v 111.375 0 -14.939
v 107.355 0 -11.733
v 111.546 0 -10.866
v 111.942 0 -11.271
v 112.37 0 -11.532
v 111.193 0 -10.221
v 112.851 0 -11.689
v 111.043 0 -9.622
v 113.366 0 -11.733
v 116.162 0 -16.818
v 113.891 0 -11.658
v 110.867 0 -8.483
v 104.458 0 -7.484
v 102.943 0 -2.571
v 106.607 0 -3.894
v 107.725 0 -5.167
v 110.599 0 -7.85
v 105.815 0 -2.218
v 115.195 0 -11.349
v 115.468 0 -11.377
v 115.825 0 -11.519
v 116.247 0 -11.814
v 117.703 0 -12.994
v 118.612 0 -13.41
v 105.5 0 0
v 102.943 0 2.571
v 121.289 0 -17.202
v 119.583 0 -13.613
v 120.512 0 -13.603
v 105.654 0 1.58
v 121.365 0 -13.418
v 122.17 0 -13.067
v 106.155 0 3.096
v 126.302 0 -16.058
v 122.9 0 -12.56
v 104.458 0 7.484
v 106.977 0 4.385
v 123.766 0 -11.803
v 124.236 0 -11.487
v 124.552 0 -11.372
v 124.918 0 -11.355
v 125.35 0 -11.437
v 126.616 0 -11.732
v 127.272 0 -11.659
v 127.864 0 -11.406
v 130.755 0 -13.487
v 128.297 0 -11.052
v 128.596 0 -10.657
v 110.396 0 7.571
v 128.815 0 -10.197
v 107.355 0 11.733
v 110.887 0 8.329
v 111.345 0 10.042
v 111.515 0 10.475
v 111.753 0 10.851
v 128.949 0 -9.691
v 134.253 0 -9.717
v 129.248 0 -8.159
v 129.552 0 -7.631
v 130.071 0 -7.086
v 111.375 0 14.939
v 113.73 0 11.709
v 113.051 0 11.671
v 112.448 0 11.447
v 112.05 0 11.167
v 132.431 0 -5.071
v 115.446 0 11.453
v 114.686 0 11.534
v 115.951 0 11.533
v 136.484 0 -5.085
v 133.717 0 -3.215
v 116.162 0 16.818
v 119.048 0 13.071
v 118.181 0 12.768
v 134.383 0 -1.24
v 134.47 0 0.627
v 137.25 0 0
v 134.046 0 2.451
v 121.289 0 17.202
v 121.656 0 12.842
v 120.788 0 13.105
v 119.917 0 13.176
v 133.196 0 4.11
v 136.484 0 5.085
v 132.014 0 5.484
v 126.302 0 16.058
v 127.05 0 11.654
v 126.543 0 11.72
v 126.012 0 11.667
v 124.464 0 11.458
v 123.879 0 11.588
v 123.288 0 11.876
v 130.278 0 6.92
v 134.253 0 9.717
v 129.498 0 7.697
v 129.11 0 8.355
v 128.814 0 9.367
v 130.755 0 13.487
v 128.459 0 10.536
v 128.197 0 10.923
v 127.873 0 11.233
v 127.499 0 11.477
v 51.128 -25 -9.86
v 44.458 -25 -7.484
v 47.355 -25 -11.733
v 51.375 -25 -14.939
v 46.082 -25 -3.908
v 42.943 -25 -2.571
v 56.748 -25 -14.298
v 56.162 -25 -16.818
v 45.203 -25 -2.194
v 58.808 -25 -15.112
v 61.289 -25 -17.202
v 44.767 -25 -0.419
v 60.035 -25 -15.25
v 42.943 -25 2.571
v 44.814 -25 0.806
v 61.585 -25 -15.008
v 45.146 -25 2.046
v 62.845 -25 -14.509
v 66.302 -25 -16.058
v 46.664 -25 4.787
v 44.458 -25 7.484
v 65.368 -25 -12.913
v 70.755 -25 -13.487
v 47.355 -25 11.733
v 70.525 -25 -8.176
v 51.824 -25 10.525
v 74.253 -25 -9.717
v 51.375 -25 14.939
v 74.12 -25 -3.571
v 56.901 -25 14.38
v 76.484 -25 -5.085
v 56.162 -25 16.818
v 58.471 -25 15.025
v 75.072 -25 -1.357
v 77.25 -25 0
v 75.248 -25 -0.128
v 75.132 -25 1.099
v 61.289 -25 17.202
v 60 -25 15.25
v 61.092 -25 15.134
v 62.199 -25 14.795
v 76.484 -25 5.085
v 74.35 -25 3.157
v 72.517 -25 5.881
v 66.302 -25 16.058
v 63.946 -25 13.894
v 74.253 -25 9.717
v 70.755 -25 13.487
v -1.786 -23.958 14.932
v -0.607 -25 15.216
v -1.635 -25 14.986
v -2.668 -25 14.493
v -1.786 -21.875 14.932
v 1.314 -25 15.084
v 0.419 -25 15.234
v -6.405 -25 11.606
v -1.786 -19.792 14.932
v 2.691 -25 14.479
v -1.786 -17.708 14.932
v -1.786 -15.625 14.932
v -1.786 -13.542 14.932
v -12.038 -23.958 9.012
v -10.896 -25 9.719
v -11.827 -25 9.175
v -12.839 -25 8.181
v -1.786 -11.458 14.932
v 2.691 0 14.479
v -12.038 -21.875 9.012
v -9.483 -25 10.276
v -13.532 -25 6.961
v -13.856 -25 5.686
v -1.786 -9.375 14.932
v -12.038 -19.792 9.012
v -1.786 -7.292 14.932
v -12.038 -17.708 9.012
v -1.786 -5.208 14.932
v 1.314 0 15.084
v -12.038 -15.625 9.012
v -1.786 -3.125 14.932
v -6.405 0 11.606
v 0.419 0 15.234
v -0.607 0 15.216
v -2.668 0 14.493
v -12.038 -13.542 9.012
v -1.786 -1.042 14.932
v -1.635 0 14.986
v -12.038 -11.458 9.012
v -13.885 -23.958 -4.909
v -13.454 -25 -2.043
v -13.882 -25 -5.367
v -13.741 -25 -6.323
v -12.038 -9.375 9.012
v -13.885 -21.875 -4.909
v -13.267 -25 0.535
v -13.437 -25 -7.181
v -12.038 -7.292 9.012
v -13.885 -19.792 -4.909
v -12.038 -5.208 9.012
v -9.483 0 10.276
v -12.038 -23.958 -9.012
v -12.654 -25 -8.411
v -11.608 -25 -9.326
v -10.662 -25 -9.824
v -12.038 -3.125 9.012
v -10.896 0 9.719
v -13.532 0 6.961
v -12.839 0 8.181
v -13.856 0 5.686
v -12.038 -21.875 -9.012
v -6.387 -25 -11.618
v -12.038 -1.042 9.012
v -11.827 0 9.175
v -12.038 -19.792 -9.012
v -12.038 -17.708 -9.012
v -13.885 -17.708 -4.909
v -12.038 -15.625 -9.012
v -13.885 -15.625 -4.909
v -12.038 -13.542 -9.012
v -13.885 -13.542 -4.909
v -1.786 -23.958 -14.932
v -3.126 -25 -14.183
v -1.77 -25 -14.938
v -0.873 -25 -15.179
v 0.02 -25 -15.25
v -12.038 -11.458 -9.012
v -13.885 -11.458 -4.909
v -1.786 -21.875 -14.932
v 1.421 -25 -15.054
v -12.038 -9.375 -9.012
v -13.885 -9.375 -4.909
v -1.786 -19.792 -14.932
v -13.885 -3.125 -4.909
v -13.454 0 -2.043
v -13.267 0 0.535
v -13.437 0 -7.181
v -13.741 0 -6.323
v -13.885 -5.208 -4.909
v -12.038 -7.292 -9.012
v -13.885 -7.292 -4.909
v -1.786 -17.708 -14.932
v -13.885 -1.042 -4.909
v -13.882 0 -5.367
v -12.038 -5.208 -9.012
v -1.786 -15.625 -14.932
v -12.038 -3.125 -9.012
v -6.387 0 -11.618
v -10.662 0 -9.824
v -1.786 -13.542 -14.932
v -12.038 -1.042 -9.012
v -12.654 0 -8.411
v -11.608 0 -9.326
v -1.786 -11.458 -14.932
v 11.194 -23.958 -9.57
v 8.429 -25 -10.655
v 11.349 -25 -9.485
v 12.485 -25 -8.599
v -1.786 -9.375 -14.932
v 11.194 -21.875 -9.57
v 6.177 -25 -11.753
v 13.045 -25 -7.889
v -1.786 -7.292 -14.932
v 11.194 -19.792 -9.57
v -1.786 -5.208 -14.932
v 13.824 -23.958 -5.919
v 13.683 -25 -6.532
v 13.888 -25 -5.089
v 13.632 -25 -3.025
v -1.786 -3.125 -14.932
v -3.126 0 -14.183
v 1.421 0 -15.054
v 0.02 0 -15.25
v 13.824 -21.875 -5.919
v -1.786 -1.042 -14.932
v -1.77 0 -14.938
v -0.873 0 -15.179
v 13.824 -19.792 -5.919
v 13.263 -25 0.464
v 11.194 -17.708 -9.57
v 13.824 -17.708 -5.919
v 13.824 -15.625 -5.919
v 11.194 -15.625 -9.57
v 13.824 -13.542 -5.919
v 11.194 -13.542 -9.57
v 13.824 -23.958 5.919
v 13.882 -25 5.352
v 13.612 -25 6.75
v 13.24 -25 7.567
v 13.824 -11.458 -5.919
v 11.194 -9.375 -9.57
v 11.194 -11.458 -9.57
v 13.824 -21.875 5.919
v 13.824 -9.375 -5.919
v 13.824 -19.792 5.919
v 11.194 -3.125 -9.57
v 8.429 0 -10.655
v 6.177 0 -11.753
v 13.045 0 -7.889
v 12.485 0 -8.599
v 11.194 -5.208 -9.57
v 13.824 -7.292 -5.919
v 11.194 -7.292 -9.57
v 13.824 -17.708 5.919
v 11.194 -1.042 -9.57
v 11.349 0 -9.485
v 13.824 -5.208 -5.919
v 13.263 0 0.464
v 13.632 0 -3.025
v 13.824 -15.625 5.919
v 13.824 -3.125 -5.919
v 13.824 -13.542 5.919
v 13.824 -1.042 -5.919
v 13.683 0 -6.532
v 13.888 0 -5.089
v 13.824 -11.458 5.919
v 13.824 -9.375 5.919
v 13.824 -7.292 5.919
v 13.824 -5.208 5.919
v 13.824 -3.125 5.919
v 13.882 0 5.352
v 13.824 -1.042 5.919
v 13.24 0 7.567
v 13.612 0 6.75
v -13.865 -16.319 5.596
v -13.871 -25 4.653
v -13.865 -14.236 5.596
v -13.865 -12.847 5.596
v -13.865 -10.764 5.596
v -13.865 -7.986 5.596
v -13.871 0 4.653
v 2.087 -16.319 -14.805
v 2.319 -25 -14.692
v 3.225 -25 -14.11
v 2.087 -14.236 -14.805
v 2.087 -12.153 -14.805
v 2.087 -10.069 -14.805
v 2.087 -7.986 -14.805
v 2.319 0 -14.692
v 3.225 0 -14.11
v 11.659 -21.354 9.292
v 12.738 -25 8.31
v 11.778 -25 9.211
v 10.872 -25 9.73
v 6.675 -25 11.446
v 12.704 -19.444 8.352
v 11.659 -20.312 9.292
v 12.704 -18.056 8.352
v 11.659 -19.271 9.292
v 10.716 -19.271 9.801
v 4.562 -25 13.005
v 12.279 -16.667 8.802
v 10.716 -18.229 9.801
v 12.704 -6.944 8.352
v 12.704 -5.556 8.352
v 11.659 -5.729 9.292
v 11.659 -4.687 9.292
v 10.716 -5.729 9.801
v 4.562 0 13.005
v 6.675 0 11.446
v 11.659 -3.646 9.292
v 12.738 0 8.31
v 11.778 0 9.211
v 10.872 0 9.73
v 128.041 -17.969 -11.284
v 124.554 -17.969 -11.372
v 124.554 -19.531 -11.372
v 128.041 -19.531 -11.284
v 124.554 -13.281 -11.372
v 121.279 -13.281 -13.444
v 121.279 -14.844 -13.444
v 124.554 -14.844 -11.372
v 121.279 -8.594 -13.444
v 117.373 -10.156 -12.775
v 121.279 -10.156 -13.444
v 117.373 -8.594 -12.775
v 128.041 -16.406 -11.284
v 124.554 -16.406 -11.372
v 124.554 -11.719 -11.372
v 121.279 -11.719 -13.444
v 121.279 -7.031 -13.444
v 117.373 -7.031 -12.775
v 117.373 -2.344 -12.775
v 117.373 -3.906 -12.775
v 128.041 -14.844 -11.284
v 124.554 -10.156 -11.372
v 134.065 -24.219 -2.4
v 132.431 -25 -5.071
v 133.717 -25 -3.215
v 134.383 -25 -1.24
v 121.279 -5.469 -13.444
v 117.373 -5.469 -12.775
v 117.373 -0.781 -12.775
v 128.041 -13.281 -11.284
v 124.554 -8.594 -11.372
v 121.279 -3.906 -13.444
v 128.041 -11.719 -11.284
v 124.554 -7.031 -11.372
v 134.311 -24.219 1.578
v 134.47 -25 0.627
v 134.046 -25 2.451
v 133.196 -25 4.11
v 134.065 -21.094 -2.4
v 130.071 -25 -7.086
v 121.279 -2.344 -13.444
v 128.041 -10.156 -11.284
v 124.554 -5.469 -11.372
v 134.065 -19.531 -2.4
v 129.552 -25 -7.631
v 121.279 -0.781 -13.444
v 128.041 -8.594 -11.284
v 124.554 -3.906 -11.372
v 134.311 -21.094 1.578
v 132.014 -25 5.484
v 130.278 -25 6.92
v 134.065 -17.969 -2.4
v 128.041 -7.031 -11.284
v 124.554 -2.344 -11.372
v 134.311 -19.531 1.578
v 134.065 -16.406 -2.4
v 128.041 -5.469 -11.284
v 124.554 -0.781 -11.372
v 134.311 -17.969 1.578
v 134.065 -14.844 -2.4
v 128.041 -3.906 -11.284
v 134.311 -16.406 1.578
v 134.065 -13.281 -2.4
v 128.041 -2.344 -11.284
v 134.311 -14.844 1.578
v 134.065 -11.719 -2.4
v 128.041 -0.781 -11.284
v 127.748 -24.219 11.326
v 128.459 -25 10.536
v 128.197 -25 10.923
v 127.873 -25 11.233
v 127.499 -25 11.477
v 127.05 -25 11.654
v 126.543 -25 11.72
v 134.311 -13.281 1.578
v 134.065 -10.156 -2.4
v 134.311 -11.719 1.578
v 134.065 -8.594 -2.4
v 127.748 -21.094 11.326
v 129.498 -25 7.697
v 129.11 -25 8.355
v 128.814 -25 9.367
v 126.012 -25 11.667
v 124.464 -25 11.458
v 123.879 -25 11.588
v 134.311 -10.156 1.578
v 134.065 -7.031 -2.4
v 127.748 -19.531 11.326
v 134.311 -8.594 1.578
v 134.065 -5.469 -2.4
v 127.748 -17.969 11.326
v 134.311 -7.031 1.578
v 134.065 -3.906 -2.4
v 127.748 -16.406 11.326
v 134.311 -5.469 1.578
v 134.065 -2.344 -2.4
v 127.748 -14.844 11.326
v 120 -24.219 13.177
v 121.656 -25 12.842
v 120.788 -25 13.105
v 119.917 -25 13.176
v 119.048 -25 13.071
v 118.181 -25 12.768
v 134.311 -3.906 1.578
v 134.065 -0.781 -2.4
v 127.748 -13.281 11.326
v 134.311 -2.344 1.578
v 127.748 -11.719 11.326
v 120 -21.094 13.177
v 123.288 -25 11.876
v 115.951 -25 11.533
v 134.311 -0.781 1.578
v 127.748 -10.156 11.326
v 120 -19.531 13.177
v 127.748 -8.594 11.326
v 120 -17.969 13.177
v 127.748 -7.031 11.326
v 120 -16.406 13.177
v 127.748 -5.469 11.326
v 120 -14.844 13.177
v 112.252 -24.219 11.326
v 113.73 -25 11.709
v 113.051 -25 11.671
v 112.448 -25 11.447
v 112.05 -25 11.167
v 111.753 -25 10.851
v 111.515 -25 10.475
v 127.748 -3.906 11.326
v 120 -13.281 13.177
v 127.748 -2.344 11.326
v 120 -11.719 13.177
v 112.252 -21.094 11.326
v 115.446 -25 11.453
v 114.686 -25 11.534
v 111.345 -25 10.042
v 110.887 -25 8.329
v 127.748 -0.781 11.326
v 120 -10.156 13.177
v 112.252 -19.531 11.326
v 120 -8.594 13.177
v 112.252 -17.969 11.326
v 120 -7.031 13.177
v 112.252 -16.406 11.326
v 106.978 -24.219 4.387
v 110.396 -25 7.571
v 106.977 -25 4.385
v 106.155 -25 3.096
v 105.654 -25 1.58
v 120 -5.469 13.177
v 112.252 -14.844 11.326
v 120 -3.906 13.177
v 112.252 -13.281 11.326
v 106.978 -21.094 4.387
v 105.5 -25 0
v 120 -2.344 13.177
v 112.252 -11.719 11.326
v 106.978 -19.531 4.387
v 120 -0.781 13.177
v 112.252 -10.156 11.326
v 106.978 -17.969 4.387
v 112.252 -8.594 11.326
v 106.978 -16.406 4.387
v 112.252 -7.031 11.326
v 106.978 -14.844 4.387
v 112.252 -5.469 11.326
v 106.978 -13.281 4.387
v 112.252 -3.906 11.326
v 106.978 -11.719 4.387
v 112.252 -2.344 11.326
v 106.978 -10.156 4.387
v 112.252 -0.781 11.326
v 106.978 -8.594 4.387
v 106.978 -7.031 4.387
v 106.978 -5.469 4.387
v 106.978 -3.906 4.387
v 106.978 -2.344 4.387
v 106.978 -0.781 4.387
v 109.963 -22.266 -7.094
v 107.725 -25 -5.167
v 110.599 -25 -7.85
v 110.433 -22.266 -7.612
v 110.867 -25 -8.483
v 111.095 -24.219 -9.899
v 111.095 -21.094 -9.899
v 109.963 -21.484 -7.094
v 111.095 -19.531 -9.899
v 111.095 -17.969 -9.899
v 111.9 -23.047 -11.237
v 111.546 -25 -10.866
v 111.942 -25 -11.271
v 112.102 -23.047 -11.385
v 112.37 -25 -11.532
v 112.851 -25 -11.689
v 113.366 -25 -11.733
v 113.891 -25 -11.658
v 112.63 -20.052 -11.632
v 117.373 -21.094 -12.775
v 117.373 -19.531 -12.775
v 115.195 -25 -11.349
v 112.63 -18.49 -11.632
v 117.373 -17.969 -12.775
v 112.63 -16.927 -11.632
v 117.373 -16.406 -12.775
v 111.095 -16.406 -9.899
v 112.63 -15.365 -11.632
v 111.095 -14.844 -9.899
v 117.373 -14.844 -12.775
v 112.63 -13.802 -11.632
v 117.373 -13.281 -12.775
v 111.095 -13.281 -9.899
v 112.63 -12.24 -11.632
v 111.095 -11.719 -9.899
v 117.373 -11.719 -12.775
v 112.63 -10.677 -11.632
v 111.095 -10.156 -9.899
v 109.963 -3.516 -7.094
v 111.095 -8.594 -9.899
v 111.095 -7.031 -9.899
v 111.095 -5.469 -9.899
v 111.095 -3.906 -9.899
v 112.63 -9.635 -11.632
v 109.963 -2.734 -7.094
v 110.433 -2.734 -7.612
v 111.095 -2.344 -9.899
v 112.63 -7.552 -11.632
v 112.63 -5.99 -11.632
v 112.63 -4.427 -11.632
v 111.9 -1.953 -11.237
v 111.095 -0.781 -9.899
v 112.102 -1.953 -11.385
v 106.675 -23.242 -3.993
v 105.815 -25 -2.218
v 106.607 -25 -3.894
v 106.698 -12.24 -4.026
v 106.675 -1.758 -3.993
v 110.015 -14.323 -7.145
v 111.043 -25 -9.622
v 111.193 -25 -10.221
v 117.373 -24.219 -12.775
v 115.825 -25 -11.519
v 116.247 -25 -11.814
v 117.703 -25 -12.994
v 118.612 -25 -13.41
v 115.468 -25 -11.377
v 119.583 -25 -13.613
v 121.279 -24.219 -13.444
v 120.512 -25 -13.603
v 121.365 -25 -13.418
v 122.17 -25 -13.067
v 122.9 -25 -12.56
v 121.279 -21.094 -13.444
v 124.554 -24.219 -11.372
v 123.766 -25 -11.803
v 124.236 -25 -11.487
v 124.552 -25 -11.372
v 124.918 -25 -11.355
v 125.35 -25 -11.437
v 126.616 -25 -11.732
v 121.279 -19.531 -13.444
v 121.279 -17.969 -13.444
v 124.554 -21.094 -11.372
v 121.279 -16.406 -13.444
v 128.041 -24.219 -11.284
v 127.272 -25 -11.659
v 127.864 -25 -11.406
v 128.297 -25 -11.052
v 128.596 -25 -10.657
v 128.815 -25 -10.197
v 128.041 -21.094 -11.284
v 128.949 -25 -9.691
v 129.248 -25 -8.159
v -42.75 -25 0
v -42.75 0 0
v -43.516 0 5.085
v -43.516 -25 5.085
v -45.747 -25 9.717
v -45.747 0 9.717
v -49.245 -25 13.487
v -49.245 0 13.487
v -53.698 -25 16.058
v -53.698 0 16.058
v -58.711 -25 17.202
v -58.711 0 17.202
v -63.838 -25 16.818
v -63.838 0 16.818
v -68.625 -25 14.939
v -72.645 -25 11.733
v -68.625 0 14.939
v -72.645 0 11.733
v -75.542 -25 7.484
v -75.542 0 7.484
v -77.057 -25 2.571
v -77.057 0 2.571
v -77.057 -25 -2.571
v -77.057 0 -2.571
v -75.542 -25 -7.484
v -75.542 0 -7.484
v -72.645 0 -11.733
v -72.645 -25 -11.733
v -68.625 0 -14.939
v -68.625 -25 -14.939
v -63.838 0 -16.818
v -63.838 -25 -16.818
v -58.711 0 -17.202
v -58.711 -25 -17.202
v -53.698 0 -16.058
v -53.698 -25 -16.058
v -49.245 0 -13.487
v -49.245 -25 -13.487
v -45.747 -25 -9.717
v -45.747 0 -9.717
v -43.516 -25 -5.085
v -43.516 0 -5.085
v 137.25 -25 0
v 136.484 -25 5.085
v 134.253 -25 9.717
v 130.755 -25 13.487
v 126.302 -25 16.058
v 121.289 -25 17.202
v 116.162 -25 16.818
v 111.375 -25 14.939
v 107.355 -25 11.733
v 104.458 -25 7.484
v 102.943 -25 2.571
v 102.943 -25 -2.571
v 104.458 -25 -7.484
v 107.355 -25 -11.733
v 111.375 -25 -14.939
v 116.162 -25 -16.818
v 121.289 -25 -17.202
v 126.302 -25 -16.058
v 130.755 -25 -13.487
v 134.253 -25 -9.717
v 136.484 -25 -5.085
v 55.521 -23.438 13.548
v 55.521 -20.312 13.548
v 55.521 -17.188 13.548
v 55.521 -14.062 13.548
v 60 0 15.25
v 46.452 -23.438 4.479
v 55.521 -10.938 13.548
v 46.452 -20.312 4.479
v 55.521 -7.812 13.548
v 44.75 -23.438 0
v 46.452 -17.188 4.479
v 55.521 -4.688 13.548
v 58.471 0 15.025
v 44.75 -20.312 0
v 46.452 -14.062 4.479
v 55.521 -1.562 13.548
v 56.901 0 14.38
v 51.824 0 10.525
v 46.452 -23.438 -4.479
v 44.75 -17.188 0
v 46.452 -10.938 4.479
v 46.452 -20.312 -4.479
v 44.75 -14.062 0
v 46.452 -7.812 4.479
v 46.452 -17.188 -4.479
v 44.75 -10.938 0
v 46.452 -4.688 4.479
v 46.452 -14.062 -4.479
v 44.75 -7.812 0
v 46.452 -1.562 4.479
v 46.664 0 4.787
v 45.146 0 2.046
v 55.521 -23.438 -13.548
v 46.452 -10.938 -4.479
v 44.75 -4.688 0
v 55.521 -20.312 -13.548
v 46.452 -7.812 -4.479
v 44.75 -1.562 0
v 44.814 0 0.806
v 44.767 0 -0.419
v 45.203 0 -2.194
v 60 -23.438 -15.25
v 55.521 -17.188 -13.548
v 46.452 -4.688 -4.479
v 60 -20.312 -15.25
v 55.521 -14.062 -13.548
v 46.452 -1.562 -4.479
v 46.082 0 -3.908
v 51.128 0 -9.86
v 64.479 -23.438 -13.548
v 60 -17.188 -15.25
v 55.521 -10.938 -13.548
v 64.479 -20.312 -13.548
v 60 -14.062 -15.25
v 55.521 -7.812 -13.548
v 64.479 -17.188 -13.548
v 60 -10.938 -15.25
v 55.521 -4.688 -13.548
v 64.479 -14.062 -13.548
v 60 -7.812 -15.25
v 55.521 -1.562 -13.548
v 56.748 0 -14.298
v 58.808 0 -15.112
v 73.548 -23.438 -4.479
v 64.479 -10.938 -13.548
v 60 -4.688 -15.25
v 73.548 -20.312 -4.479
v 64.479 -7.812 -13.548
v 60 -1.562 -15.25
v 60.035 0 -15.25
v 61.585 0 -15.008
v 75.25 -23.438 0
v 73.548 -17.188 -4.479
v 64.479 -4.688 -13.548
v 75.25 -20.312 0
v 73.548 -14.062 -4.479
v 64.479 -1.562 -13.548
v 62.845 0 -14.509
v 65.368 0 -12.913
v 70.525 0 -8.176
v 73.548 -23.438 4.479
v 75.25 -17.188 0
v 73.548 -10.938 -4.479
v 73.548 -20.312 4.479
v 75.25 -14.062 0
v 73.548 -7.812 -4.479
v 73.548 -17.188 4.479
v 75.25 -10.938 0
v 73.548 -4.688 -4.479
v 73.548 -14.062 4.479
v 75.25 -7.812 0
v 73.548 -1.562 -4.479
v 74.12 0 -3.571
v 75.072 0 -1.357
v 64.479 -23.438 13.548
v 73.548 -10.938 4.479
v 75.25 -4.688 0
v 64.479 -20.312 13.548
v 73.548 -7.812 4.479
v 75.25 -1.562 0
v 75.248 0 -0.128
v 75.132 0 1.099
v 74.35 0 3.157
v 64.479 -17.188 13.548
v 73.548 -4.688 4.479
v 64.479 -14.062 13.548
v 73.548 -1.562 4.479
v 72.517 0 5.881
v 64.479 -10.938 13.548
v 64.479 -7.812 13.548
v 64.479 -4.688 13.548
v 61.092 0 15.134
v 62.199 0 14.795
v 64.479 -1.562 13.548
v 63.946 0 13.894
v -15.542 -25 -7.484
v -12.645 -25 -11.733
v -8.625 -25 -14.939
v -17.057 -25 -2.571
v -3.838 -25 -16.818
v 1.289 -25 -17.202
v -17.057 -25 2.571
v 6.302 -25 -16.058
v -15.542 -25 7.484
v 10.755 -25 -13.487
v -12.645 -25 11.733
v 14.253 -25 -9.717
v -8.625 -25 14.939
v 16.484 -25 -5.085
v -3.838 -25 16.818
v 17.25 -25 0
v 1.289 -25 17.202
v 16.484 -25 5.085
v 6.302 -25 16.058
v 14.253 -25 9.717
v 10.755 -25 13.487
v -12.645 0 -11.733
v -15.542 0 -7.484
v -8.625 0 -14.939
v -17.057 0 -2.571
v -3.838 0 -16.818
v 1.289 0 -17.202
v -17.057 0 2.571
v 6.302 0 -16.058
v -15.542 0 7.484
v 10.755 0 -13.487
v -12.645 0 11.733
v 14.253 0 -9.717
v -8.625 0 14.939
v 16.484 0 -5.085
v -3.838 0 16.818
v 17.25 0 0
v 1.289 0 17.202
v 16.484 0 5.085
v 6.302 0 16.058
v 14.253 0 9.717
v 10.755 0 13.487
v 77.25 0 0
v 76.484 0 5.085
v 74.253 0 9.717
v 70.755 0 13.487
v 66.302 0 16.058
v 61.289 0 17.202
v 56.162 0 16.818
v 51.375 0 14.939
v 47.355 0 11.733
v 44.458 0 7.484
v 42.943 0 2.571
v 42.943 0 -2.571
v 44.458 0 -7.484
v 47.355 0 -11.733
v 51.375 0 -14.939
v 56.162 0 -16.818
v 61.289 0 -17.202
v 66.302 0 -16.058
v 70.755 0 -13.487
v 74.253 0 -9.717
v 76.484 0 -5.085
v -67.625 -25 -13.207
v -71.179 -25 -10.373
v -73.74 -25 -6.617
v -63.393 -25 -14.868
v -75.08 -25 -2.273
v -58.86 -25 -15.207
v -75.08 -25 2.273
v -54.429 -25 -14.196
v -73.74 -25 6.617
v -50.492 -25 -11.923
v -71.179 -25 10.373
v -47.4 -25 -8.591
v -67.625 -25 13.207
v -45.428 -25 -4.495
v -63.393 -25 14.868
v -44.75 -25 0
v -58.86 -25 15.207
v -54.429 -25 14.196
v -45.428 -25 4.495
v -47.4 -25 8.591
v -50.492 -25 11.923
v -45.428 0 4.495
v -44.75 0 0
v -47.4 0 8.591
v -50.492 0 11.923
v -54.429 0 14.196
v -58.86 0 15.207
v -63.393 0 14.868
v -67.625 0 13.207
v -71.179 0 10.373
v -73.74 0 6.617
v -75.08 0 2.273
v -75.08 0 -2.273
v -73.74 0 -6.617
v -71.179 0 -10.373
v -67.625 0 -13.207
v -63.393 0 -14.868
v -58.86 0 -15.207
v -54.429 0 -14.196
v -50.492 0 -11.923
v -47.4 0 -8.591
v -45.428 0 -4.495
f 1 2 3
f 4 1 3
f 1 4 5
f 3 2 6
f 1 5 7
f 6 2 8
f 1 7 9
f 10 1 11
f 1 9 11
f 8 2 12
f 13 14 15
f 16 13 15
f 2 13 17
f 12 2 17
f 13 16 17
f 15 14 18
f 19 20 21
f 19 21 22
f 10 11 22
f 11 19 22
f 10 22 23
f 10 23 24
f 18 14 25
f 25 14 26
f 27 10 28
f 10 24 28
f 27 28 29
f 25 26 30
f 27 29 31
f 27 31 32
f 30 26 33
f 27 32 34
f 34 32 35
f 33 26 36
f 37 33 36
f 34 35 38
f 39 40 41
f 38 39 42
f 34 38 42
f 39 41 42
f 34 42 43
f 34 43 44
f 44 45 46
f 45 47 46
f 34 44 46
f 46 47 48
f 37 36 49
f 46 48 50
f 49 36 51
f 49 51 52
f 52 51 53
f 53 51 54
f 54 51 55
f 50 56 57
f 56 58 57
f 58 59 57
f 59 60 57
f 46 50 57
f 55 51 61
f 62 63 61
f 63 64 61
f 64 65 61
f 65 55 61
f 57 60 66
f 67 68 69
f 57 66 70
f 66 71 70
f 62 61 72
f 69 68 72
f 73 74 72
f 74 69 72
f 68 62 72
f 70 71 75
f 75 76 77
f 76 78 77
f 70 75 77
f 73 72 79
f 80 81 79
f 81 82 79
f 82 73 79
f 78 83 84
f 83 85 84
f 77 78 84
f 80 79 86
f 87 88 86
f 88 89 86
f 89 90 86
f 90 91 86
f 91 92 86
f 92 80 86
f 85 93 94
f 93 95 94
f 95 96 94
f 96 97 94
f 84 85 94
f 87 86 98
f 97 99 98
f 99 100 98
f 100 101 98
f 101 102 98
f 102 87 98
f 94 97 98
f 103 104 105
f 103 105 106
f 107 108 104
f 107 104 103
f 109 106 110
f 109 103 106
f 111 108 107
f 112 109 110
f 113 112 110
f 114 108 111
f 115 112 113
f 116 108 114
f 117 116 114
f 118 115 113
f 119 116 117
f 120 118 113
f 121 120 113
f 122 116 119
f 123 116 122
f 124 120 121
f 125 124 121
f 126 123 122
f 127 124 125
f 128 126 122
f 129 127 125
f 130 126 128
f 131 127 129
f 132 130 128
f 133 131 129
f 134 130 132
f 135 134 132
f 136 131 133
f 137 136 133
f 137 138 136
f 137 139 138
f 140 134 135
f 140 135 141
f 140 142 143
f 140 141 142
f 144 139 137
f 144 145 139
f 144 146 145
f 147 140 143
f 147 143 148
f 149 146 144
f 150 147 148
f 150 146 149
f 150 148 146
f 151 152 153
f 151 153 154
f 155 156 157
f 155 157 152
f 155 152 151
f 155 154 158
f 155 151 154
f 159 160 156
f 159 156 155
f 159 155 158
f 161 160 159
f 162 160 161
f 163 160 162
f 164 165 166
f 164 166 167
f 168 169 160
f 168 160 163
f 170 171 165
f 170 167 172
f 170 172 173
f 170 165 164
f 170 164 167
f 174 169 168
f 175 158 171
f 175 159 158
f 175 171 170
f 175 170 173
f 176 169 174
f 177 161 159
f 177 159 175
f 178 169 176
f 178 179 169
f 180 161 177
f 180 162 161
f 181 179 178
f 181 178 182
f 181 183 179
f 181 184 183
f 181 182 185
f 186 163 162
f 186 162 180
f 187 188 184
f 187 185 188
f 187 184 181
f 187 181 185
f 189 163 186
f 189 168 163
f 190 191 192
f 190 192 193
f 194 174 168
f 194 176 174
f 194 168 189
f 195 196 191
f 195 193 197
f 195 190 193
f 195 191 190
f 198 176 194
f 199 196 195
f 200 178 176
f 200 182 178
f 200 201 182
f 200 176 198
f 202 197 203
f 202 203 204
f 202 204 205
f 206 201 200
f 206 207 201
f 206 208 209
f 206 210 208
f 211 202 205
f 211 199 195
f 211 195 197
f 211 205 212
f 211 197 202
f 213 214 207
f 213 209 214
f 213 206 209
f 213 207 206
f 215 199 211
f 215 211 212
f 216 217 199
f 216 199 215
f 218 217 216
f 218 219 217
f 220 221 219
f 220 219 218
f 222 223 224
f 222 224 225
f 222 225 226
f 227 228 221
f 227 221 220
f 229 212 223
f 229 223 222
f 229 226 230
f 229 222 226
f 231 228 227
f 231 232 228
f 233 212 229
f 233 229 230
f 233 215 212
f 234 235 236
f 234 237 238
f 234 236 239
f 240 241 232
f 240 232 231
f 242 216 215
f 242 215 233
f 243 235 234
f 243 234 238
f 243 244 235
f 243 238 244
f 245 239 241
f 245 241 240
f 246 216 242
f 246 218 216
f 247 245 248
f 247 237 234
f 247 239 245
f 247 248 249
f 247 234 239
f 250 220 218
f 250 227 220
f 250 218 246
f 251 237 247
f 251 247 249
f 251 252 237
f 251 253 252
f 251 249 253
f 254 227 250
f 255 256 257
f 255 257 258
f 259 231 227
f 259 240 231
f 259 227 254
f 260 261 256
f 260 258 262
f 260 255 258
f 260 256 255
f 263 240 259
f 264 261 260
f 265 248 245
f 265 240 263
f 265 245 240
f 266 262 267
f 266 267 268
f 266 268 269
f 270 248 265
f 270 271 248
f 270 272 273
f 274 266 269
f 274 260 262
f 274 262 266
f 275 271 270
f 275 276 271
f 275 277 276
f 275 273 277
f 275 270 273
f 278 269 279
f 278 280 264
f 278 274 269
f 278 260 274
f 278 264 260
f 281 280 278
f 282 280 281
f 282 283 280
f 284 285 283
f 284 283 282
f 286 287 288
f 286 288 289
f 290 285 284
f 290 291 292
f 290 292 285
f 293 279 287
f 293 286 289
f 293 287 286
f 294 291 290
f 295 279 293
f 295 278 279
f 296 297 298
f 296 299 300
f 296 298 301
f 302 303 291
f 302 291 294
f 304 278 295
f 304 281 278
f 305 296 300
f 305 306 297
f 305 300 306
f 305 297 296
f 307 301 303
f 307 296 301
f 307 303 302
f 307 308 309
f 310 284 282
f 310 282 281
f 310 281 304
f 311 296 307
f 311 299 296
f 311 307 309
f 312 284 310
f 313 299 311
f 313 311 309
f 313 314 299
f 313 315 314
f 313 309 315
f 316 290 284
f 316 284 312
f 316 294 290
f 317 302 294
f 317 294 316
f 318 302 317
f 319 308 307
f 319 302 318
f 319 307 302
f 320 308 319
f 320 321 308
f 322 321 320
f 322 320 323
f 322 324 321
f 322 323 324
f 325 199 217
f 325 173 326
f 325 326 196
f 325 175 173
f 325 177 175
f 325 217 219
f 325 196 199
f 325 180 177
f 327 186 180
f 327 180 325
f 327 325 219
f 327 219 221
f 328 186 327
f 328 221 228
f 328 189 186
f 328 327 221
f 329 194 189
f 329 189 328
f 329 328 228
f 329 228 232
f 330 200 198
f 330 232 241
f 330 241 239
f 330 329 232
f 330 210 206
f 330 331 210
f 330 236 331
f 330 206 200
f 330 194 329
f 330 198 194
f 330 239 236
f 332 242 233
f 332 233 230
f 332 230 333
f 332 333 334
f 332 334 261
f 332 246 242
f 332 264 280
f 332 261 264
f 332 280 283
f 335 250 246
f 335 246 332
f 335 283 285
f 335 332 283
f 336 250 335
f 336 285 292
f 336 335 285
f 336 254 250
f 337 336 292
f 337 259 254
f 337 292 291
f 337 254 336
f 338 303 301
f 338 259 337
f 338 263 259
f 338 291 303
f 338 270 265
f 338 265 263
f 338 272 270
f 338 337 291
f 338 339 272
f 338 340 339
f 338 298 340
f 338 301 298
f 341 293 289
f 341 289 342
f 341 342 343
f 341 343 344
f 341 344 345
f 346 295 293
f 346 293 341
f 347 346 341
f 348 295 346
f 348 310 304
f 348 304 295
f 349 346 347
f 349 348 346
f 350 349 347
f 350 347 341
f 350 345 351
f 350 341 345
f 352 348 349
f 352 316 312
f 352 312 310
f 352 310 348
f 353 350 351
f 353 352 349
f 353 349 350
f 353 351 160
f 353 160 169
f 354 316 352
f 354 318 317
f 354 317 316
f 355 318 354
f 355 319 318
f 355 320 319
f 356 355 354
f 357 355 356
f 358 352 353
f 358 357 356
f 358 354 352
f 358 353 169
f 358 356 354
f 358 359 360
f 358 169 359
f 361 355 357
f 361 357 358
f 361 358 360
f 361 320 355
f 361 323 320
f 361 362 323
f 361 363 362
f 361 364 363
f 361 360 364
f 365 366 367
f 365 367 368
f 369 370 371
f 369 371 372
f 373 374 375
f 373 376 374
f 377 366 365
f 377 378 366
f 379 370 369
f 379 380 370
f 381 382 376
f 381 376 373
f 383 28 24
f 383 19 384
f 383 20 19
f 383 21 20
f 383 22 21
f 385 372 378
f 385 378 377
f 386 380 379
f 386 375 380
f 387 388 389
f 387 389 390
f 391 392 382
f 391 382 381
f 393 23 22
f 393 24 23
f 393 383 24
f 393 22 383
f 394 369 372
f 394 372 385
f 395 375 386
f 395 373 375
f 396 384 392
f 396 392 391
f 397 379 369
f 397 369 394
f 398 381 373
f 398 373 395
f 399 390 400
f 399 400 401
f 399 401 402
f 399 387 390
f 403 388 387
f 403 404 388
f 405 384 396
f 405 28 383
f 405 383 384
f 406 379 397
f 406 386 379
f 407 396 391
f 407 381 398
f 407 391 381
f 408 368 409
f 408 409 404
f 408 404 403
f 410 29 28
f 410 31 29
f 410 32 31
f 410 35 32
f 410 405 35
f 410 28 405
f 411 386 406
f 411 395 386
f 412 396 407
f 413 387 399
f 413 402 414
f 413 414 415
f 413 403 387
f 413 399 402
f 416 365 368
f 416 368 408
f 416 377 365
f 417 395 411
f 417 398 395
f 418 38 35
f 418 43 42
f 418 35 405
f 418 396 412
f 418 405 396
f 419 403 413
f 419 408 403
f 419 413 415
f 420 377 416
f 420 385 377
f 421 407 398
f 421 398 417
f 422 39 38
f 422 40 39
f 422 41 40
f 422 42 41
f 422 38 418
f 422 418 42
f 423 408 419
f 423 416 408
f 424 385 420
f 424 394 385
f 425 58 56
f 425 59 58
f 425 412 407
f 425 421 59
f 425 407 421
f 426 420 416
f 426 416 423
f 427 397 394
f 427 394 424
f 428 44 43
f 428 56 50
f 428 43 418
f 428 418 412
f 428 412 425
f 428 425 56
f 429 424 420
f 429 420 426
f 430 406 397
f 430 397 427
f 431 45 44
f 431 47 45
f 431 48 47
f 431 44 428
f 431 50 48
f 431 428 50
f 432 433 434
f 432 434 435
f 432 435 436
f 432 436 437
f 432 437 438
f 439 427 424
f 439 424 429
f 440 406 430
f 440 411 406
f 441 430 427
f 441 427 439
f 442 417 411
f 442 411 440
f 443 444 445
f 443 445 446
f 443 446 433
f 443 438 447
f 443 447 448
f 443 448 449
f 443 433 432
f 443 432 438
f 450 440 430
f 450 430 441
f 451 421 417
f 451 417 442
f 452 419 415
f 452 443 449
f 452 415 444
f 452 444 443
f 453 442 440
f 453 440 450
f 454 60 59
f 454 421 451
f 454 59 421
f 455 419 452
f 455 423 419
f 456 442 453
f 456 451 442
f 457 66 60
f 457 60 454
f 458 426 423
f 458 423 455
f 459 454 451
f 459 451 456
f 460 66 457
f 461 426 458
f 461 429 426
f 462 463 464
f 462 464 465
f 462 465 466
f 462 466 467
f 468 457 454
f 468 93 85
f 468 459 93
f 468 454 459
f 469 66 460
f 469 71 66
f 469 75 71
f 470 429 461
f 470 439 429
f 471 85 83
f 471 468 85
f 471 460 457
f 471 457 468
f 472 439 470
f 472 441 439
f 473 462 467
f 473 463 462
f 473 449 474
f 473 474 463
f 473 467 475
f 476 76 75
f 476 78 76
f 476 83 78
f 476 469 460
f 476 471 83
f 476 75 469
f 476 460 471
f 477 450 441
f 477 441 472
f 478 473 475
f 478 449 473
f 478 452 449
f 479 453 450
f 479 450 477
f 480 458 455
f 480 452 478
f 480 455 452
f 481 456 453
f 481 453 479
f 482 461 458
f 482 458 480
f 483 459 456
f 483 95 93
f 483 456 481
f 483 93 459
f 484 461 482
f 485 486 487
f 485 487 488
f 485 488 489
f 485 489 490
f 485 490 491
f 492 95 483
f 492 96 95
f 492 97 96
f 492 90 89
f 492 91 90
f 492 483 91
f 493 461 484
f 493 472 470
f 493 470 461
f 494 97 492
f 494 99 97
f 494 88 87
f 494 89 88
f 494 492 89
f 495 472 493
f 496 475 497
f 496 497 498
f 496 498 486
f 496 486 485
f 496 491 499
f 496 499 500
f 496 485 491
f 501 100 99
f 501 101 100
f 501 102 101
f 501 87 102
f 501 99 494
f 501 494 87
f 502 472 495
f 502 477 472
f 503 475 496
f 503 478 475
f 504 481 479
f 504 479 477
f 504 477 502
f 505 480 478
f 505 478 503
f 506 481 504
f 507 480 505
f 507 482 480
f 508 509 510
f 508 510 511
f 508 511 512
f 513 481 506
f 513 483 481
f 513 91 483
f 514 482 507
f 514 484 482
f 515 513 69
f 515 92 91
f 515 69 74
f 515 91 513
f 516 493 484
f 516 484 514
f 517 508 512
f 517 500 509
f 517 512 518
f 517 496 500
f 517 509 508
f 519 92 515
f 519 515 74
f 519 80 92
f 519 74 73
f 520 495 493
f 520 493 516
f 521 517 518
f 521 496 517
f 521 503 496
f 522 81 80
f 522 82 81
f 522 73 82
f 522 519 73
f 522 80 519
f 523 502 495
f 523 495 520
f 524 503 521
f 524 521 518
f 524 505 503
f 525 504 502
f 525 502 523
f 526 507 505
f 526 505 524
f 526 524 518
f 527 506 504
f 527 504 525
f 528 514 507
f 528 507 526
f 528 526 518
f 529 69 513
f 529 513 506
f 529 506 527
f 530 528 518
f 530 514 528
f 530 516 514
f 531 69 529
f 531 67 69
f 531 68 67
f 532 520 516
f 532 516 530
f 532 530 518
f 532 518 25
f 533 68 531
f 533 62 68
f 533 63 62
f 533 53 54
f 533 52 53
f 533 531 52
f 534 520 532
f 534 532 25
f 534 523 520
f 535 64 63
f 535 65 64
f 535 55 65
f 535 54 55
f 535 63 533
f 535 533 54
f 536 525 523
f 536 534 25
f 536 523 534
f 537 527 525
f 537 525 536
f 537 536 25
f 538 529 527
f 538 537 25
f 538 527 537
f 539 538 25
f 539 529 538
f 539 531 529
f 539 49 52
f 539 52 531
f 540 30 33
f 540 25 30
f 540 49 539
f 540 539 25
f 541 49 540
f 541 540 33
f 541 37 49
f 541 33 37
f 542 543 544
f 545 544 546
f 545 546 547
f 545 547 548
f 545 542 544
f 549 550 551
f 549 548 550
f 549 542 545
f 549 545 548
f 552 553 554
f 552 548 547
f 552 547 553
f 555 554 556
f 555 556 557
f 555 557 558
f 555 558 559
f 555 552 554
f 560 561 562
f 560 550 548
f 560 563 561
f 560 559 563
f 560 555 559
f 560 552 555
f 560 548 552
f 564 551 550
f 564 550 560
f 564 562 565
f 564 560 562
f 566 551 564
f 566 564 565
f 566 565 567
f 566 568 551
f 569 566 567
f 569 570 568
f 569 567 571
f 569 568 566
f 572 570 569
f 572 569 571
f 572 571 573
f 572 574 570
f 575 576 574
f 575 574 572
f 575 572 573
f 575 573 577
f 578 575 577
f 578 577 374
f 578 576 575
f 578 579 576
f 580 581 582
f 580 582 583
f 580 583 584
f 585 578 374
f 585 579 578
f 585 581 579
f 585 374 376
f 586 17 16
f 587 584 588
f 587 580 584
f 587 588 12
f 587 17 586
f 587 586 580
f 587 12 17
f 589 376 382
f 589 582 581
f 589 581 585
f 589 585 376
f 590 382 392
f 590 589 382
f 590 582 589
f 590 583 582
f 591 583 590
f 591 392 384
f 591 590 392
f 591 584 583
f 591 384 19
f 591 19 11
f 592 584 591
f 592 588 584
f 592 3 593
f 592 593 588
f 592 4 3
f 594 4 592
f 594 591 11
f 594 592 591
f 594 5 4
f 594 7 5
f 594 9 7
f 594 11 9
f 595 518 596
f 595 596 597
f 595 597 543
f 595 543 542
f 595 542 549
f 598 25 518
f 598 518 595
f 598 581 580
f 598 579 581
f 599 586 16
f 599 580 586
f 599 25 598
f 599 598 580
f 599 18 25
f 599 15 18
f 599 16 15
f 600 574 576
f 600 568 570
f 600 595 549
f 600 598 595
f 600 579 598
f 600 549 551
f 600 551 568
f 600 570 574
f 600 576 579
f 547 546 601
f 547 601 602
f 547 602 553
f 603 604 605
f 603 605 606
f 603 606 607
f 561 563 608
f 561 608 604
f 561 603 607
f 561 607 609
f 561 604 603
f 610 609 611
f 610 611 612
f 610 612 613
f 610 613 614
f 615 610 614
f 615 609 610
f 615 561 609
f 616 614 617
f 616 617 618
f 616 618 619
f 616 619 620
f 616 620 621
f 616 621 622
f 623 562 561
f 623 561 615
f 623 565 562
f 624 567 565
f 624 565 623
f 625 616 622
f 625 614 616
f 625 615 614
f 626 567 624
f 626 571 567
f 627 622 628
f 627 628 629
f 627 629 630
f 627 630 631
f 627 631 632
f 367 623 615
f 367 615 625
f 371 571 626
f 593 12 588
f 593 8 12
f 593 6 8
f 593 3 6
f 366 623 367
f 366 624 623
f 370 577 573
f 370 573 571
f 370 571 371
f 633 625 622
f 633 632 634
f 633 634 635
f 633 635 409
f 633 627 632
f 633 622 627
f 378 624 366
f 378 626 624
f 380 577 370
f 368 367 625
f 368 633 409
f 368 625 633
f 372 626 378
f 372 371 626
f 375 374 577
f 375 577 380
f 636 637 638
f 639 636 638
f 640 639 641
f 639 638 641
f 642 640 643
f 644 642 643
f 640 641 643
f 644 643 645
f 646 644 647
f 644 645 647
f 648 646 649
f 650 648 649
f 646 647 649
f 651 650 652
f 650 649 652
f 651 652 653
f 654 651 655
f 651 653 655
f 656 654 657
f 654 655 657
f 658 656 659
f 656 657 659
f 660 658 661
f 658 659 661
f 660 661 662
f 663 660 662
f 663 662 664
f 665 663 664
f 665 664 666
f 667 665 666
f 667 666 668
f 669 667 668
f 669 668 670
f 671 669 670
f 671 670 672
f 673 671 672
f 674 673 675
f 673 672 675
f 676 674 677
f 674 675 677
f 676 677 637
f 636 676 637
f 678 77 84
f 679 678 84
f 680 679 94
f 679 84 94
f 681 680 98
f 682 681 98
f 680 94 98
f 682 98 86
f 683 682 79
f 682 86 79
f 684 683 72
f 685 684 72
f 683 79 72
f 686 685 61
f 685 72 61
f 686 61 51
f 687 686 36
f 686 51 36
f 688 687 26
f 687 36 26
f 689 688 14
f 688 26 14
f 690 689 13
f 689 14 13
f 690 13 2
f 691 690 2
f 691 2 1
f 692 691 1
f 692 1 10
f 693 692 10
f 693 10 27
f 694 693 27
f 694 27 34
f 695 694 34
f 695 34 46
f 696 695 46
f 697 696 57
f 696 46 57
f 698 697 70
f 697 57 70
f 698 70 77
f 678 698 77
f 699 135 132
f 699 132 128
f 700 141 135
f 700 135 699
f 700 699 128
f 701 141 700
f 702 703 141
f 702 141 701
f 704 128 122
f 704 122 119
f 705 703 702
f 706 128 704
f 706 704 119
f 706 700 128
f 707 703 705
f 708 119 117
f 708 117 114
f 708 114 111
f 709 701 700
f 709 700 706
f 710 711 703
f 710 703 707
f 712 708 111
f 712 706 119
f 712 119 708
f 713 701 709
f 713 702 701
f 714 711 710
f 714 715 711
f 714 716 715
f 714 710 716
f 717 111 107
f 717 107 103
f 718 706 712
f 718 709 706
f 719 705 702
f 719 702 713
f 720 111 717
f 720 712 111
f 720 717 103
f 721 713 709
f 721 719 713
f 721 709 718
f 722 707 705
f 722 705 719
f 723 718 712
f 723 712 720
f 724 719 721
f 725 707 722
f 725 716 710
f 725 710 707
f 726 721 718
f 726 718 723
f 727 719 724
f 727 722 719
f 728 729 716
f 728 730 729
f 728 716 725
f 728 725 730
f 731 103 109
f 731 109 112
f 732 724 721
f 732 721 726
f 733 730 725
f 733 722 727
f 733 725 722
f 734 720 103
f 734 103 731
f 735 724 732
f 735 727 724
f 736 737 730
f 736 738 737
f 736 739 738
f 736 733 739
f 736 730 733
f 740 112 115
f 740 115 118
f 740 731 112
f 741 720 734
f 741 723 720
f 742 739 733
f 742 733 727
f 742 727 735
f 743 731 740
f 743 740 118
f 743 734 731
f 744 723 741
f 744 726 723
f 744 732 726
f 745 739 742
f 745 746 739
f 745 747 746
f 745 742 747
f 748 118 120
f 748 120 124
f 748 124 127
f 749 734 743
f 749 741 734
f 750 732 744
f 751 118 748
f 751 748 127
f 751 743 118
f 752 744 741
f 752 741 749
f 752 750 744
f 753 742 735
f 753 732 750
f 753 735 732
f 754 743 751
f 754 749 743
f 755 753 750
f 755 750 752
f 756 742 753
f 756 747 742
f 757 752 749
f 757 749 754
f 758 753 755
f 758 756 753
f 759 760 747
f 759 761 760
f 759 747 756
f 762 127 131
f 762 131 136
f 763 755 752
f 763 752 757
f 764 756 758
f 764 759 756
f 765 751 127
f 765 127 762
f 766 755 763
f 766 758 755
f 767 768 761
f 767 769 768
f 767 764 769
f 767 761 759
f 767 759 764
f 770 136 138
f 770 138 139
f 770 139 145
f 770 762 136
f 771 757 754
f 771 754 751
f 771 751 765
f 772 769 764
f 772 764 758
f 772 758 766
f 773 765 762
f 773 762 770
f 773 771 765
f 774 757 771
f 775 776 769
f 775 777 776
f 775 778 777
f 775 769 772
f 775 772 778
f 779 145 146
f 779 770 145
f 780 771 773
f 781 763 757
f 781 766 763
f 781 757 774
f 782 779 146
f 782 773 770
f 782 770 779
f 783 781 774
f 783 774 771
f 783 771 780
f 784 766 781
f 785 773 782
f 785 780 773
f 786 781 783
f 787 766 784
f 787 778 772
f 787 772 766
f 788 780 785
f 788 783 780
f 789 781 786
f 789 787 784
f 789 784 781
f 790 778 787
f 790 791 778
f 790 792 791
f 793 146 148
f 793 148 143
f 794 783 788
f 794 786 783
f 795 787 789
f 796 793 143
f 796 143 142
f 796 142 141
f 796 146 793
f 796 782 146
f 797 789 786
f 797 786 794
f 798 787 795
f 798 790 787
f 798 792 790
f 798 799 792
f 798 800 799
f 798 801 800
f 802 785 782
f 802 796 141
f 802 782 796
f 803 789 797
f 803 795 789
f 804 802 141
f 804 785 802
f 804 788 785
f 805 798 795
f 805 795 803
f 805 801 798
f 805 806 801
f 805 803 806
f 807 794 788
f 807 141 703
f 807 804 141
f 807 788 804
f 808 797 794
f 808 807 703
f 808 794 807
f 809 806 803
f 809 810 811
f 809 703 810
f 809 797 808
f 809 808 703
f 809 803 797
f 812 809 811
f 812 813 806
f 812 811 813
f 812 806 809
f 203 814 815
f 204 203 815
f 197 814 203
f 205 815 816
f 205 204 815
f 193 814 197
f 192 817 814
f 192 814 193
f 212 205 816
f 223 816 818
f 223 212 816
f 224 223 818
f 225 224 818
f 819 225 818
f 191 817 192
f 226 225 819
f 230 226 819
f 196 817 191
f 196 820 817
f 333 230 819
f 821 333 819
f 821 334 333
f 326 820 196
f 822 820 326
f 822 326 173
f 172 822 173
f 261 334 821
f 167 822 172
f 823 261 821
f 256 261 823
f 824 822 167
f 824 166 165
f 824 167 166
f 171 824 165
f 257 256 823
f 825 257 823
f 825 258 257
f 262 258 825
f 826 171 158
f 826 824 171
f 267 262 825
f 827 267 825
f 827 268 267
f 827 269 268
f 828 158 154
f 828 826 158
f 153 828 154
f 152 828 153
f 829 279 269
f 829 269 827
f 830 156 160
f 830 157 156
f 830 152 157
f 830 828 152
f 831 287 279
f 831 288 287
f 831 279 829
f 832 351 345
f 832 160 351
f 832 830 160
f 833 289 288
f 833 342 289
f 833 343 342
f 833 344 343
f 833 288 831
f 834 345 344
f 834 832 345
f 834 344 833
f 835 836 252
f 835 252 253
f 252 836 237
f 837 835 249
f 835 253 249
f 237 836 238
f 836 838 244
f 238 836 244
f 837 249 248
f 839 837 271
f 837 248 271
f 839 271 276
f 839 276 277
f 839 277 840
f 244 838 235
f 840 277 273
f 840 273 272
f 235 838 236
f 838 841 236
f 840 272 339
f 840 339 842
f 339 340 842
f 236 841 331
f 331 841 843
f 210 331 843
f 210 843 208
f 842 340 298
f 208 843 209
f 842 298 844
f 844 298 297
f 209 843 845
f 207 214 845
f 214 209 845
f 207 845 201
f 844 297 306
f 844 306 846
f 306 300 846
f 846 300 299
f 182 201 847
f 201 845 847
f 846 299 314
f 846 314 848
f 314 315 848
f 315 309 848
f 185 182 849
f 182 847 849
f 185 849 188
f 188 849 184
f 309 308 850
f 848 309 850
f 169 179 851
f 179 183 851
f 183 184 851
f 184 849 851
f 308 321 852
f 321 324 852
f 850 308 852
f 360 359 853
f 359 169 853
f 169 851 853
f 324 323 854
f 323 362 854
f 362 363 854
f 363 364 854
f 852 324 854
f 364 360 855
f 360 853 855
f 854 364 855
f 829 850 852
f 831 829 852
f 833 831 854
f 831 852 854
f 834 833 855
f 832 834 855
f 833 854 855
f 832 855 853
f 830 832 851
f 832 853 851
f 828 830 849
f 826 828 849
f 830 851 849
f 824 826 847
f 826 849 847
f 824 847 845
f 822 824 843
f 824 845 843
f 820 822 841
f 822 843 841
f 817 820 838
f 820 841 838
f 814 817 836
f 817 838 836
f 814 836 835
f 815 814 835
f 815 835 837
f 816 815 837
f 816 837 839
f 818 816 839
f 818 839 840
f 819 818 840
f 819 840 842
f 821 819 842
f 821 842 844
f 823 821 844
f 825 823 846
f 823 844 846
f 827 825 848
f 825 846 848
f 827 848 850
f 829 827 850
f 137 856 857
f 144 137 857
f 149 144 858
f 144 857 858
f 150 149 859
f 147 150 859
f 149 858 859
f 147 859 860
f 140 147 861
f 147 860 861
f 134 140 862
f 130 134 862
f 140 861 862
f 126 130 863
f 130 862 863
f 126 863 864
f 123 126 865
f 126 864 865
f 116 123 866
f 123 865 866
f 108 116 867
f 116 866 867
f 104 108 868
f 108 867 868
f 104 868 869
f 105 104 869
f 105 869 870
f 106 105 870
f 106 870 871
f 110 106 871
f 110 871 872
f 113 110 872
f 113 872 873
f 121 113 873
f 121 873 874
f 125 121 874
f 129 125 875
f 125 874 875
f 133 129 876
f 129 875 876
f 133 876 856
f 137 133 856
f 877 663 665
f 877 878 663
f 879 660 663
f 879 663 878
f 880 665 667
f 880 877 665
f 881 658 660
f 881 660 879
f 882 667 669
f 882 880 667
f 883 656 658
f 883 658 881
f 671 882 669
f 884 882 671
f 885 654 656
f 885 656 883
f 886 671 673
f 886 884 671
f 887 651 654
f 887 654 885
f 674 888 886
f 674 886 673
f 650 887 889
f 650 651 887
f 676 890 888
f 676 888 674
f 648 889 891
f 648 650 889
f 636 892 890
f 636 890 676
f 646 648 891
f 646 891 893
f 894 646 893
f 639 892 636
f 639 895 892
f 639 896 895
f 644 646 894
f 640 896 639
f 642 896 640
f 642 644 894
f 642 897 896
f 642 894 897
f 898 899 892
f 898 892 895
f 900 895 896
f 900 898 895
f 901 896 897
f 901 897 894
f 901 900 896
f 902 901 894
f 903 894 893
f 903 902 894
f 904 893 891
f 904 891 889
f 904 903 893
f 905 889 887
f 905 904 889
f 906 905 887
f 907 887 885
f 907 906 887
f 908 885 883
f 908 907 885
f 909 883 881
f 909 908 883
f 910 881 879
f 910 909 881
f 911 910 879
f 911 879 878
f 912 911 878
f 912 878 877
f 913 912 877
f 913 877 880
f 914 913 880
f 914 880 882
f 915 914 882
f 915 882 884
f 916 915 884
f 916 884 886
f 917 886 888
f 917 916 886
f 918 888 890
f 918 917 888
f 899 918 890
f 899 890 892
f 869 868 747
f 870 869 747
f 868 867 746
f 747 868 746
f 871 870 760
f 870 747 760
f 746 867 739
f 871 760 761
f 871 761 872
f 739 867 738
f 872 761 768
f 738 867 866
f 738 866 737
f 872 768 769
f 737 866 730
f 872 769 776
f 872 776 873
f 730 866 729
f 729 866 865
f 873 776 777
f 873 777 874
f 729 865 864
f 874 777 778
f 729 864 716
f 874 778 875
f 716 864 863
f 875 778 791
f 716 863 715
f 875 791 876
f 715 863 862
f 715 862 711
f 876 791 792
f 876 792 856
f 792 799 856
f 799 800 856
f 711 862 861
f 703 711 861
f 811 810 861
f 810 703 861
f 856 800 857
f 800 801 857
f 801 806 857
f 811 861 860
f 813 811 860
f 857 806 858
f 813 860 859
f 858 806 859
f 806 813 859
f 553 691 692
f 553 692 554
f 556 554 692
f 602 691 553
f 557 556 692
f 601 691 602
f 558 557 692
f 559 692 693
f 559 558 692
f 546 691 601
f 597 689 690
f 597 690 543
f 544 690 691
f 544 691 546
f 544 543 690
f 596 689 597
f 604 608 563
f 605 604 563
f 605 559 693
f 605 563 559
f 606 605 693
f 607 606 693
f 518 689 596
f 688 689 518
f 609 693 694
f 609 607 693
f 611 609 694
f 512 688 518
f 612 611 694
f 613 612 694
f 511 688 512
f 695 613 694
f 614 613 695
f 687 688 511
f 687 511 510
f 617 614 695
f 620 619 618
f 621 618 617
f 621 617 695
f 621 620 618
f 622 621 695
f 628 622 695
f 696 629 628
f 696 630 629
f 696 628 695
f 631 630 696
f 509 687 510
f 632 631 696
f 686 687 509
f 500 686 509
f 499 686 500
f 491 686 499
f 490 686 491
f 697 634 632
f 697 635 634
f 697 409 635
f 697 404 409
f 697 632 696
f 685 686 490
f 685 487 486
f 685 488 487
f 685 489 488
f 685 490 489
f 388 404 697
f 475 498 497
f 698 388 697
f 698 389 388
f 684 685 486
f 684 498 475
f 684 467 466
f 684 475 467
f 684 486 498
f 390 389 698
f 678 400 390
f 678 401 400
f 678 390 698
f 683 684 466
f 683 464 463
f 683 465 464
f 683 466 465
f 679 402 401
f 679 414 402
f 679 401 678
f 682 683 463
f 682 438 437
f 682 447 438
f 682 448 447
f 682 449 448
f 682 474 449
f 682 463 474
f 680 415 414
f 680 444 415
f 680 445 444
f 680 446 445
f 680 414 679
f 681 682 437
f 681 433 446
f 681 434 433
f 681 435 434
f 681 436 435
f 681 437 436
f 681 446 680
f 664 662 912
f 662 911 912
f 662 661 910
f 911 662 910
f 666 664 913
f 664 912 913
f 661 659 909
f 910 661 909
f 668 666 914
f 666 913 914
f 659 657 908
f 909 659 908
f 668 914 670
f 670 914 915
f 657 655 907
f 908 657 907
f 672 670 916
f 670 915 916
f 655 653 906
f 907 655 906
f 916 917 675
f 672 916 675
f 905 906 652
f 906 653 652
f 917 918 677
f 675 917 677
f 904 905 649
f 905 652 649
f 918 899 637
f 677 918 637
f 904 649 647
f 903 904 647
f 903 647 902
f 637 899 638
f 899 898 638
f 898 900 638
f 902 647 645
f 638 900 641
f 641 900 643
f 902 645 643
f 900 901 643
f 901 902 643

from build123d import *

# Parameters (mm, degrees)
F0_R     = 17.25
F1_DEPTH = 25
F0_R_2   = 15.25


with BuildPart() as f1:
    # F0 (on Front) → F1 (new body)
    with BuildSketch(Plane.XZ):
        with Locations((60, 0)):
            Circle(F0_R)
        with BuildLine():
            add(Edge.make_bspline(
                [(60, 15.25), (58.7759575884, 15.25), (55.8963577881, 14.1884640958), (50.5025623878, 9.4974376122), (45.8115359042, 4.1036422119), (44.298768906, 0), (45.8115359042, -4.1036422119), (50.5025623878, -9.4974376122), (55.8963577881, -14.1884640958), (60, -15.701231094), (64.1036422119, -14.1884640958), (69.4974376122, -9.4974376122), (74.1884640958, -4.1036422119), (75.701231094, 0), (74.1884640958, 4.1036422119), (69.4974376122, 9.4974376122), (64.1036422119, 14.1884640958), (61.2240424116, 15.25), (60, 15.25)],
                knots=[0, 0, 0, 0, 0.0531342242, 0.125, 0.1968657758, 0.25, 0.3031342242, 0.375, 0.4468657758, 0.5, 0.5531342242, 0.625, 0.6968657758, 0.75, 0.8031342242, 0.875, 0.9468657758, 1, 1, 1, 1], degree=3))
        make_face(mode=Mode.SUBTRACT)
    extrude(amount=F1_DEPTH)


with BuildPart() as f1b:
    # F0 (on Front) → F1, piece 2 (new body)
    with BuildSketch(Plane.XZ):
        Circle(F0_R)
        with BuildLine():
            add(Edge.make_bspline(
                [(2.690890027, 14.4793675188), (1.7872147977, 15.0432115566), (0, 15.4567884434), (-2.9755840917, 14.7682126736), (-6.3317744739, 10.9669550908), (-11.301855298, 9.9610377514), (-13.3859714529, 7.7283942217), (-14.2774393898, 4.8071749222), (-12.6635489478, 0), (-14.2774393897, -4.8071749223), (-13.3859714529, -7.7283942217), (-11.301855298, -9.9610377514), (-6.3317744739, -10.9669550908), (-2.9755840917, -14.7682126736), (0, -15.4567884434), (2.9755840917, -14.7682126736), (6.3317744739, -10.9669550908), (11.301855298, -9.9610377514), (13.3859714529, -7.7283942217), (14.2774393897, -4.8071749223), (12.6635489478, 0), (14.2774393898, 4.8071749222), (13.3859714529, 7.7283942217), (11.301855298, 9.9610377514), (6.3317744739, 10.9669550909), (3.8926480873, 13.7295360582), (2.690890027, 14.4793675188)],
                knots=[0, 0, 0, 0, 0.0357675874, 0.0715351747, 0.1191009207, 0.1666666667, 0.202434254, 0.2382018414, 0.2857675874, 0.3333333333, 0.3691009207, 0.404868508, 0.452434254, 0.5, 0.5357675874, 0.5715351747, 0.6191009207, 0.6666666667, 0.702434254, 0.7382018414, 0.7857675874, 0.8333333333, 0.8691009207, 0.904868508, 0.952434254, 1, 1, 1, 1], degree=3))
        make_face(mode=Mode.SUBTRACT)
    extrude(amount=F1_DEPTH)


with BuildPart() as f1c:
    # F0 (on Front) → F1, piece 3 (new body)
    with BuildSketch(Plane.XZ):
        with Locations((-60, 0)):
            Circle(F0_R)
        with Locations((-60, 0)):
            Circle(F0_R_2, mode=Mode.SUBTRACT)
    extrude(amount=F1_DEPTH)


with BuildPart() as f1d:
    # F0 (on Front) → F1, piece 4 (new body)
    with BuildSketch(Plane.XZ):
        with Locations((120, 0)):
            Circle(F0_R)
        with BuildLine():
            add(Edge.make_bspline(
                [(105.5, 0), (105.5, -1.5585373599), (106.3444254978, -4.7435925207), (111.149752088, -7.4671746198), (110.8731620411, -9.8956468764), (111.8721595957, -11.5080358721), (113.6804883136, -11.9508851317), (115.5866455927, -10.8505065232), (117.2770640308, -13.0600661875), (119.9999050801, -13.9300007184), (122.7233021315, -13.0602292925), (124.4129724722, -10.8489725977), (126.324065694, -11.9539047189), (128.1299641031, -11.5010896893), (129.1123509232, -9.9206429059), (128.9315755344, -7.473511814), (132.9501160345, -5.3931533807), (135.3294716699, -0.0012110379), (132.9435281346, 5.397954553), (128.8810867446, 7.5095381354), (128.8083557022, 10.2714581449), (127.8158805995, 11.4163446466), (126.3997373488, 11.9478615634), (124.1603075379, 11.0033220206), (122.0990319108, 12.8620510559), (119.9979394002, 13.3262410877), (117.9096517451, 12.8616934077), (115.8251385859, 11.020933973), (113.718319332, 11.9262180808), (112.1626530134, 11.4552994344), (111.1558251843, 10.1340428222), (111.183941861, 7.5300789), (106.3464479513, 4.7284084604), (105.5, 1.5529430381), (105.5, 0)],
                knots=[0, 0, 0, 0, 0.0418341105, 0.0851091151, 0.1131475967, 0.1383400331, 0.1635324695, 0.1896731777, 0.2195863132, 0.2517926449, 0.2839989766, 0.3139121121, 0.3400914161, 0.3652466581, 0.3904019002, 0.4184763423, 0.4577071946, 0.5031420879, 0.5484537622, 0.5883989275, 0.6183920377, 0.6411198006, 0.6638475635, 0.6923531031, 0.7233003414, 0.7512545263, 0.7792087112, 0.8101559495, 0.8379057503, 0.8615055577, 0.885105365, 0.9143797117, 0.9583160517, 1, 1, 1, 1], degree=3))
        make_face(mode=Mode.SUBTRACT)
    extrude(amount=F1_DEPTH)


solid = Compound([f1.part, f1b.part, f1c.part, f1d.part])
